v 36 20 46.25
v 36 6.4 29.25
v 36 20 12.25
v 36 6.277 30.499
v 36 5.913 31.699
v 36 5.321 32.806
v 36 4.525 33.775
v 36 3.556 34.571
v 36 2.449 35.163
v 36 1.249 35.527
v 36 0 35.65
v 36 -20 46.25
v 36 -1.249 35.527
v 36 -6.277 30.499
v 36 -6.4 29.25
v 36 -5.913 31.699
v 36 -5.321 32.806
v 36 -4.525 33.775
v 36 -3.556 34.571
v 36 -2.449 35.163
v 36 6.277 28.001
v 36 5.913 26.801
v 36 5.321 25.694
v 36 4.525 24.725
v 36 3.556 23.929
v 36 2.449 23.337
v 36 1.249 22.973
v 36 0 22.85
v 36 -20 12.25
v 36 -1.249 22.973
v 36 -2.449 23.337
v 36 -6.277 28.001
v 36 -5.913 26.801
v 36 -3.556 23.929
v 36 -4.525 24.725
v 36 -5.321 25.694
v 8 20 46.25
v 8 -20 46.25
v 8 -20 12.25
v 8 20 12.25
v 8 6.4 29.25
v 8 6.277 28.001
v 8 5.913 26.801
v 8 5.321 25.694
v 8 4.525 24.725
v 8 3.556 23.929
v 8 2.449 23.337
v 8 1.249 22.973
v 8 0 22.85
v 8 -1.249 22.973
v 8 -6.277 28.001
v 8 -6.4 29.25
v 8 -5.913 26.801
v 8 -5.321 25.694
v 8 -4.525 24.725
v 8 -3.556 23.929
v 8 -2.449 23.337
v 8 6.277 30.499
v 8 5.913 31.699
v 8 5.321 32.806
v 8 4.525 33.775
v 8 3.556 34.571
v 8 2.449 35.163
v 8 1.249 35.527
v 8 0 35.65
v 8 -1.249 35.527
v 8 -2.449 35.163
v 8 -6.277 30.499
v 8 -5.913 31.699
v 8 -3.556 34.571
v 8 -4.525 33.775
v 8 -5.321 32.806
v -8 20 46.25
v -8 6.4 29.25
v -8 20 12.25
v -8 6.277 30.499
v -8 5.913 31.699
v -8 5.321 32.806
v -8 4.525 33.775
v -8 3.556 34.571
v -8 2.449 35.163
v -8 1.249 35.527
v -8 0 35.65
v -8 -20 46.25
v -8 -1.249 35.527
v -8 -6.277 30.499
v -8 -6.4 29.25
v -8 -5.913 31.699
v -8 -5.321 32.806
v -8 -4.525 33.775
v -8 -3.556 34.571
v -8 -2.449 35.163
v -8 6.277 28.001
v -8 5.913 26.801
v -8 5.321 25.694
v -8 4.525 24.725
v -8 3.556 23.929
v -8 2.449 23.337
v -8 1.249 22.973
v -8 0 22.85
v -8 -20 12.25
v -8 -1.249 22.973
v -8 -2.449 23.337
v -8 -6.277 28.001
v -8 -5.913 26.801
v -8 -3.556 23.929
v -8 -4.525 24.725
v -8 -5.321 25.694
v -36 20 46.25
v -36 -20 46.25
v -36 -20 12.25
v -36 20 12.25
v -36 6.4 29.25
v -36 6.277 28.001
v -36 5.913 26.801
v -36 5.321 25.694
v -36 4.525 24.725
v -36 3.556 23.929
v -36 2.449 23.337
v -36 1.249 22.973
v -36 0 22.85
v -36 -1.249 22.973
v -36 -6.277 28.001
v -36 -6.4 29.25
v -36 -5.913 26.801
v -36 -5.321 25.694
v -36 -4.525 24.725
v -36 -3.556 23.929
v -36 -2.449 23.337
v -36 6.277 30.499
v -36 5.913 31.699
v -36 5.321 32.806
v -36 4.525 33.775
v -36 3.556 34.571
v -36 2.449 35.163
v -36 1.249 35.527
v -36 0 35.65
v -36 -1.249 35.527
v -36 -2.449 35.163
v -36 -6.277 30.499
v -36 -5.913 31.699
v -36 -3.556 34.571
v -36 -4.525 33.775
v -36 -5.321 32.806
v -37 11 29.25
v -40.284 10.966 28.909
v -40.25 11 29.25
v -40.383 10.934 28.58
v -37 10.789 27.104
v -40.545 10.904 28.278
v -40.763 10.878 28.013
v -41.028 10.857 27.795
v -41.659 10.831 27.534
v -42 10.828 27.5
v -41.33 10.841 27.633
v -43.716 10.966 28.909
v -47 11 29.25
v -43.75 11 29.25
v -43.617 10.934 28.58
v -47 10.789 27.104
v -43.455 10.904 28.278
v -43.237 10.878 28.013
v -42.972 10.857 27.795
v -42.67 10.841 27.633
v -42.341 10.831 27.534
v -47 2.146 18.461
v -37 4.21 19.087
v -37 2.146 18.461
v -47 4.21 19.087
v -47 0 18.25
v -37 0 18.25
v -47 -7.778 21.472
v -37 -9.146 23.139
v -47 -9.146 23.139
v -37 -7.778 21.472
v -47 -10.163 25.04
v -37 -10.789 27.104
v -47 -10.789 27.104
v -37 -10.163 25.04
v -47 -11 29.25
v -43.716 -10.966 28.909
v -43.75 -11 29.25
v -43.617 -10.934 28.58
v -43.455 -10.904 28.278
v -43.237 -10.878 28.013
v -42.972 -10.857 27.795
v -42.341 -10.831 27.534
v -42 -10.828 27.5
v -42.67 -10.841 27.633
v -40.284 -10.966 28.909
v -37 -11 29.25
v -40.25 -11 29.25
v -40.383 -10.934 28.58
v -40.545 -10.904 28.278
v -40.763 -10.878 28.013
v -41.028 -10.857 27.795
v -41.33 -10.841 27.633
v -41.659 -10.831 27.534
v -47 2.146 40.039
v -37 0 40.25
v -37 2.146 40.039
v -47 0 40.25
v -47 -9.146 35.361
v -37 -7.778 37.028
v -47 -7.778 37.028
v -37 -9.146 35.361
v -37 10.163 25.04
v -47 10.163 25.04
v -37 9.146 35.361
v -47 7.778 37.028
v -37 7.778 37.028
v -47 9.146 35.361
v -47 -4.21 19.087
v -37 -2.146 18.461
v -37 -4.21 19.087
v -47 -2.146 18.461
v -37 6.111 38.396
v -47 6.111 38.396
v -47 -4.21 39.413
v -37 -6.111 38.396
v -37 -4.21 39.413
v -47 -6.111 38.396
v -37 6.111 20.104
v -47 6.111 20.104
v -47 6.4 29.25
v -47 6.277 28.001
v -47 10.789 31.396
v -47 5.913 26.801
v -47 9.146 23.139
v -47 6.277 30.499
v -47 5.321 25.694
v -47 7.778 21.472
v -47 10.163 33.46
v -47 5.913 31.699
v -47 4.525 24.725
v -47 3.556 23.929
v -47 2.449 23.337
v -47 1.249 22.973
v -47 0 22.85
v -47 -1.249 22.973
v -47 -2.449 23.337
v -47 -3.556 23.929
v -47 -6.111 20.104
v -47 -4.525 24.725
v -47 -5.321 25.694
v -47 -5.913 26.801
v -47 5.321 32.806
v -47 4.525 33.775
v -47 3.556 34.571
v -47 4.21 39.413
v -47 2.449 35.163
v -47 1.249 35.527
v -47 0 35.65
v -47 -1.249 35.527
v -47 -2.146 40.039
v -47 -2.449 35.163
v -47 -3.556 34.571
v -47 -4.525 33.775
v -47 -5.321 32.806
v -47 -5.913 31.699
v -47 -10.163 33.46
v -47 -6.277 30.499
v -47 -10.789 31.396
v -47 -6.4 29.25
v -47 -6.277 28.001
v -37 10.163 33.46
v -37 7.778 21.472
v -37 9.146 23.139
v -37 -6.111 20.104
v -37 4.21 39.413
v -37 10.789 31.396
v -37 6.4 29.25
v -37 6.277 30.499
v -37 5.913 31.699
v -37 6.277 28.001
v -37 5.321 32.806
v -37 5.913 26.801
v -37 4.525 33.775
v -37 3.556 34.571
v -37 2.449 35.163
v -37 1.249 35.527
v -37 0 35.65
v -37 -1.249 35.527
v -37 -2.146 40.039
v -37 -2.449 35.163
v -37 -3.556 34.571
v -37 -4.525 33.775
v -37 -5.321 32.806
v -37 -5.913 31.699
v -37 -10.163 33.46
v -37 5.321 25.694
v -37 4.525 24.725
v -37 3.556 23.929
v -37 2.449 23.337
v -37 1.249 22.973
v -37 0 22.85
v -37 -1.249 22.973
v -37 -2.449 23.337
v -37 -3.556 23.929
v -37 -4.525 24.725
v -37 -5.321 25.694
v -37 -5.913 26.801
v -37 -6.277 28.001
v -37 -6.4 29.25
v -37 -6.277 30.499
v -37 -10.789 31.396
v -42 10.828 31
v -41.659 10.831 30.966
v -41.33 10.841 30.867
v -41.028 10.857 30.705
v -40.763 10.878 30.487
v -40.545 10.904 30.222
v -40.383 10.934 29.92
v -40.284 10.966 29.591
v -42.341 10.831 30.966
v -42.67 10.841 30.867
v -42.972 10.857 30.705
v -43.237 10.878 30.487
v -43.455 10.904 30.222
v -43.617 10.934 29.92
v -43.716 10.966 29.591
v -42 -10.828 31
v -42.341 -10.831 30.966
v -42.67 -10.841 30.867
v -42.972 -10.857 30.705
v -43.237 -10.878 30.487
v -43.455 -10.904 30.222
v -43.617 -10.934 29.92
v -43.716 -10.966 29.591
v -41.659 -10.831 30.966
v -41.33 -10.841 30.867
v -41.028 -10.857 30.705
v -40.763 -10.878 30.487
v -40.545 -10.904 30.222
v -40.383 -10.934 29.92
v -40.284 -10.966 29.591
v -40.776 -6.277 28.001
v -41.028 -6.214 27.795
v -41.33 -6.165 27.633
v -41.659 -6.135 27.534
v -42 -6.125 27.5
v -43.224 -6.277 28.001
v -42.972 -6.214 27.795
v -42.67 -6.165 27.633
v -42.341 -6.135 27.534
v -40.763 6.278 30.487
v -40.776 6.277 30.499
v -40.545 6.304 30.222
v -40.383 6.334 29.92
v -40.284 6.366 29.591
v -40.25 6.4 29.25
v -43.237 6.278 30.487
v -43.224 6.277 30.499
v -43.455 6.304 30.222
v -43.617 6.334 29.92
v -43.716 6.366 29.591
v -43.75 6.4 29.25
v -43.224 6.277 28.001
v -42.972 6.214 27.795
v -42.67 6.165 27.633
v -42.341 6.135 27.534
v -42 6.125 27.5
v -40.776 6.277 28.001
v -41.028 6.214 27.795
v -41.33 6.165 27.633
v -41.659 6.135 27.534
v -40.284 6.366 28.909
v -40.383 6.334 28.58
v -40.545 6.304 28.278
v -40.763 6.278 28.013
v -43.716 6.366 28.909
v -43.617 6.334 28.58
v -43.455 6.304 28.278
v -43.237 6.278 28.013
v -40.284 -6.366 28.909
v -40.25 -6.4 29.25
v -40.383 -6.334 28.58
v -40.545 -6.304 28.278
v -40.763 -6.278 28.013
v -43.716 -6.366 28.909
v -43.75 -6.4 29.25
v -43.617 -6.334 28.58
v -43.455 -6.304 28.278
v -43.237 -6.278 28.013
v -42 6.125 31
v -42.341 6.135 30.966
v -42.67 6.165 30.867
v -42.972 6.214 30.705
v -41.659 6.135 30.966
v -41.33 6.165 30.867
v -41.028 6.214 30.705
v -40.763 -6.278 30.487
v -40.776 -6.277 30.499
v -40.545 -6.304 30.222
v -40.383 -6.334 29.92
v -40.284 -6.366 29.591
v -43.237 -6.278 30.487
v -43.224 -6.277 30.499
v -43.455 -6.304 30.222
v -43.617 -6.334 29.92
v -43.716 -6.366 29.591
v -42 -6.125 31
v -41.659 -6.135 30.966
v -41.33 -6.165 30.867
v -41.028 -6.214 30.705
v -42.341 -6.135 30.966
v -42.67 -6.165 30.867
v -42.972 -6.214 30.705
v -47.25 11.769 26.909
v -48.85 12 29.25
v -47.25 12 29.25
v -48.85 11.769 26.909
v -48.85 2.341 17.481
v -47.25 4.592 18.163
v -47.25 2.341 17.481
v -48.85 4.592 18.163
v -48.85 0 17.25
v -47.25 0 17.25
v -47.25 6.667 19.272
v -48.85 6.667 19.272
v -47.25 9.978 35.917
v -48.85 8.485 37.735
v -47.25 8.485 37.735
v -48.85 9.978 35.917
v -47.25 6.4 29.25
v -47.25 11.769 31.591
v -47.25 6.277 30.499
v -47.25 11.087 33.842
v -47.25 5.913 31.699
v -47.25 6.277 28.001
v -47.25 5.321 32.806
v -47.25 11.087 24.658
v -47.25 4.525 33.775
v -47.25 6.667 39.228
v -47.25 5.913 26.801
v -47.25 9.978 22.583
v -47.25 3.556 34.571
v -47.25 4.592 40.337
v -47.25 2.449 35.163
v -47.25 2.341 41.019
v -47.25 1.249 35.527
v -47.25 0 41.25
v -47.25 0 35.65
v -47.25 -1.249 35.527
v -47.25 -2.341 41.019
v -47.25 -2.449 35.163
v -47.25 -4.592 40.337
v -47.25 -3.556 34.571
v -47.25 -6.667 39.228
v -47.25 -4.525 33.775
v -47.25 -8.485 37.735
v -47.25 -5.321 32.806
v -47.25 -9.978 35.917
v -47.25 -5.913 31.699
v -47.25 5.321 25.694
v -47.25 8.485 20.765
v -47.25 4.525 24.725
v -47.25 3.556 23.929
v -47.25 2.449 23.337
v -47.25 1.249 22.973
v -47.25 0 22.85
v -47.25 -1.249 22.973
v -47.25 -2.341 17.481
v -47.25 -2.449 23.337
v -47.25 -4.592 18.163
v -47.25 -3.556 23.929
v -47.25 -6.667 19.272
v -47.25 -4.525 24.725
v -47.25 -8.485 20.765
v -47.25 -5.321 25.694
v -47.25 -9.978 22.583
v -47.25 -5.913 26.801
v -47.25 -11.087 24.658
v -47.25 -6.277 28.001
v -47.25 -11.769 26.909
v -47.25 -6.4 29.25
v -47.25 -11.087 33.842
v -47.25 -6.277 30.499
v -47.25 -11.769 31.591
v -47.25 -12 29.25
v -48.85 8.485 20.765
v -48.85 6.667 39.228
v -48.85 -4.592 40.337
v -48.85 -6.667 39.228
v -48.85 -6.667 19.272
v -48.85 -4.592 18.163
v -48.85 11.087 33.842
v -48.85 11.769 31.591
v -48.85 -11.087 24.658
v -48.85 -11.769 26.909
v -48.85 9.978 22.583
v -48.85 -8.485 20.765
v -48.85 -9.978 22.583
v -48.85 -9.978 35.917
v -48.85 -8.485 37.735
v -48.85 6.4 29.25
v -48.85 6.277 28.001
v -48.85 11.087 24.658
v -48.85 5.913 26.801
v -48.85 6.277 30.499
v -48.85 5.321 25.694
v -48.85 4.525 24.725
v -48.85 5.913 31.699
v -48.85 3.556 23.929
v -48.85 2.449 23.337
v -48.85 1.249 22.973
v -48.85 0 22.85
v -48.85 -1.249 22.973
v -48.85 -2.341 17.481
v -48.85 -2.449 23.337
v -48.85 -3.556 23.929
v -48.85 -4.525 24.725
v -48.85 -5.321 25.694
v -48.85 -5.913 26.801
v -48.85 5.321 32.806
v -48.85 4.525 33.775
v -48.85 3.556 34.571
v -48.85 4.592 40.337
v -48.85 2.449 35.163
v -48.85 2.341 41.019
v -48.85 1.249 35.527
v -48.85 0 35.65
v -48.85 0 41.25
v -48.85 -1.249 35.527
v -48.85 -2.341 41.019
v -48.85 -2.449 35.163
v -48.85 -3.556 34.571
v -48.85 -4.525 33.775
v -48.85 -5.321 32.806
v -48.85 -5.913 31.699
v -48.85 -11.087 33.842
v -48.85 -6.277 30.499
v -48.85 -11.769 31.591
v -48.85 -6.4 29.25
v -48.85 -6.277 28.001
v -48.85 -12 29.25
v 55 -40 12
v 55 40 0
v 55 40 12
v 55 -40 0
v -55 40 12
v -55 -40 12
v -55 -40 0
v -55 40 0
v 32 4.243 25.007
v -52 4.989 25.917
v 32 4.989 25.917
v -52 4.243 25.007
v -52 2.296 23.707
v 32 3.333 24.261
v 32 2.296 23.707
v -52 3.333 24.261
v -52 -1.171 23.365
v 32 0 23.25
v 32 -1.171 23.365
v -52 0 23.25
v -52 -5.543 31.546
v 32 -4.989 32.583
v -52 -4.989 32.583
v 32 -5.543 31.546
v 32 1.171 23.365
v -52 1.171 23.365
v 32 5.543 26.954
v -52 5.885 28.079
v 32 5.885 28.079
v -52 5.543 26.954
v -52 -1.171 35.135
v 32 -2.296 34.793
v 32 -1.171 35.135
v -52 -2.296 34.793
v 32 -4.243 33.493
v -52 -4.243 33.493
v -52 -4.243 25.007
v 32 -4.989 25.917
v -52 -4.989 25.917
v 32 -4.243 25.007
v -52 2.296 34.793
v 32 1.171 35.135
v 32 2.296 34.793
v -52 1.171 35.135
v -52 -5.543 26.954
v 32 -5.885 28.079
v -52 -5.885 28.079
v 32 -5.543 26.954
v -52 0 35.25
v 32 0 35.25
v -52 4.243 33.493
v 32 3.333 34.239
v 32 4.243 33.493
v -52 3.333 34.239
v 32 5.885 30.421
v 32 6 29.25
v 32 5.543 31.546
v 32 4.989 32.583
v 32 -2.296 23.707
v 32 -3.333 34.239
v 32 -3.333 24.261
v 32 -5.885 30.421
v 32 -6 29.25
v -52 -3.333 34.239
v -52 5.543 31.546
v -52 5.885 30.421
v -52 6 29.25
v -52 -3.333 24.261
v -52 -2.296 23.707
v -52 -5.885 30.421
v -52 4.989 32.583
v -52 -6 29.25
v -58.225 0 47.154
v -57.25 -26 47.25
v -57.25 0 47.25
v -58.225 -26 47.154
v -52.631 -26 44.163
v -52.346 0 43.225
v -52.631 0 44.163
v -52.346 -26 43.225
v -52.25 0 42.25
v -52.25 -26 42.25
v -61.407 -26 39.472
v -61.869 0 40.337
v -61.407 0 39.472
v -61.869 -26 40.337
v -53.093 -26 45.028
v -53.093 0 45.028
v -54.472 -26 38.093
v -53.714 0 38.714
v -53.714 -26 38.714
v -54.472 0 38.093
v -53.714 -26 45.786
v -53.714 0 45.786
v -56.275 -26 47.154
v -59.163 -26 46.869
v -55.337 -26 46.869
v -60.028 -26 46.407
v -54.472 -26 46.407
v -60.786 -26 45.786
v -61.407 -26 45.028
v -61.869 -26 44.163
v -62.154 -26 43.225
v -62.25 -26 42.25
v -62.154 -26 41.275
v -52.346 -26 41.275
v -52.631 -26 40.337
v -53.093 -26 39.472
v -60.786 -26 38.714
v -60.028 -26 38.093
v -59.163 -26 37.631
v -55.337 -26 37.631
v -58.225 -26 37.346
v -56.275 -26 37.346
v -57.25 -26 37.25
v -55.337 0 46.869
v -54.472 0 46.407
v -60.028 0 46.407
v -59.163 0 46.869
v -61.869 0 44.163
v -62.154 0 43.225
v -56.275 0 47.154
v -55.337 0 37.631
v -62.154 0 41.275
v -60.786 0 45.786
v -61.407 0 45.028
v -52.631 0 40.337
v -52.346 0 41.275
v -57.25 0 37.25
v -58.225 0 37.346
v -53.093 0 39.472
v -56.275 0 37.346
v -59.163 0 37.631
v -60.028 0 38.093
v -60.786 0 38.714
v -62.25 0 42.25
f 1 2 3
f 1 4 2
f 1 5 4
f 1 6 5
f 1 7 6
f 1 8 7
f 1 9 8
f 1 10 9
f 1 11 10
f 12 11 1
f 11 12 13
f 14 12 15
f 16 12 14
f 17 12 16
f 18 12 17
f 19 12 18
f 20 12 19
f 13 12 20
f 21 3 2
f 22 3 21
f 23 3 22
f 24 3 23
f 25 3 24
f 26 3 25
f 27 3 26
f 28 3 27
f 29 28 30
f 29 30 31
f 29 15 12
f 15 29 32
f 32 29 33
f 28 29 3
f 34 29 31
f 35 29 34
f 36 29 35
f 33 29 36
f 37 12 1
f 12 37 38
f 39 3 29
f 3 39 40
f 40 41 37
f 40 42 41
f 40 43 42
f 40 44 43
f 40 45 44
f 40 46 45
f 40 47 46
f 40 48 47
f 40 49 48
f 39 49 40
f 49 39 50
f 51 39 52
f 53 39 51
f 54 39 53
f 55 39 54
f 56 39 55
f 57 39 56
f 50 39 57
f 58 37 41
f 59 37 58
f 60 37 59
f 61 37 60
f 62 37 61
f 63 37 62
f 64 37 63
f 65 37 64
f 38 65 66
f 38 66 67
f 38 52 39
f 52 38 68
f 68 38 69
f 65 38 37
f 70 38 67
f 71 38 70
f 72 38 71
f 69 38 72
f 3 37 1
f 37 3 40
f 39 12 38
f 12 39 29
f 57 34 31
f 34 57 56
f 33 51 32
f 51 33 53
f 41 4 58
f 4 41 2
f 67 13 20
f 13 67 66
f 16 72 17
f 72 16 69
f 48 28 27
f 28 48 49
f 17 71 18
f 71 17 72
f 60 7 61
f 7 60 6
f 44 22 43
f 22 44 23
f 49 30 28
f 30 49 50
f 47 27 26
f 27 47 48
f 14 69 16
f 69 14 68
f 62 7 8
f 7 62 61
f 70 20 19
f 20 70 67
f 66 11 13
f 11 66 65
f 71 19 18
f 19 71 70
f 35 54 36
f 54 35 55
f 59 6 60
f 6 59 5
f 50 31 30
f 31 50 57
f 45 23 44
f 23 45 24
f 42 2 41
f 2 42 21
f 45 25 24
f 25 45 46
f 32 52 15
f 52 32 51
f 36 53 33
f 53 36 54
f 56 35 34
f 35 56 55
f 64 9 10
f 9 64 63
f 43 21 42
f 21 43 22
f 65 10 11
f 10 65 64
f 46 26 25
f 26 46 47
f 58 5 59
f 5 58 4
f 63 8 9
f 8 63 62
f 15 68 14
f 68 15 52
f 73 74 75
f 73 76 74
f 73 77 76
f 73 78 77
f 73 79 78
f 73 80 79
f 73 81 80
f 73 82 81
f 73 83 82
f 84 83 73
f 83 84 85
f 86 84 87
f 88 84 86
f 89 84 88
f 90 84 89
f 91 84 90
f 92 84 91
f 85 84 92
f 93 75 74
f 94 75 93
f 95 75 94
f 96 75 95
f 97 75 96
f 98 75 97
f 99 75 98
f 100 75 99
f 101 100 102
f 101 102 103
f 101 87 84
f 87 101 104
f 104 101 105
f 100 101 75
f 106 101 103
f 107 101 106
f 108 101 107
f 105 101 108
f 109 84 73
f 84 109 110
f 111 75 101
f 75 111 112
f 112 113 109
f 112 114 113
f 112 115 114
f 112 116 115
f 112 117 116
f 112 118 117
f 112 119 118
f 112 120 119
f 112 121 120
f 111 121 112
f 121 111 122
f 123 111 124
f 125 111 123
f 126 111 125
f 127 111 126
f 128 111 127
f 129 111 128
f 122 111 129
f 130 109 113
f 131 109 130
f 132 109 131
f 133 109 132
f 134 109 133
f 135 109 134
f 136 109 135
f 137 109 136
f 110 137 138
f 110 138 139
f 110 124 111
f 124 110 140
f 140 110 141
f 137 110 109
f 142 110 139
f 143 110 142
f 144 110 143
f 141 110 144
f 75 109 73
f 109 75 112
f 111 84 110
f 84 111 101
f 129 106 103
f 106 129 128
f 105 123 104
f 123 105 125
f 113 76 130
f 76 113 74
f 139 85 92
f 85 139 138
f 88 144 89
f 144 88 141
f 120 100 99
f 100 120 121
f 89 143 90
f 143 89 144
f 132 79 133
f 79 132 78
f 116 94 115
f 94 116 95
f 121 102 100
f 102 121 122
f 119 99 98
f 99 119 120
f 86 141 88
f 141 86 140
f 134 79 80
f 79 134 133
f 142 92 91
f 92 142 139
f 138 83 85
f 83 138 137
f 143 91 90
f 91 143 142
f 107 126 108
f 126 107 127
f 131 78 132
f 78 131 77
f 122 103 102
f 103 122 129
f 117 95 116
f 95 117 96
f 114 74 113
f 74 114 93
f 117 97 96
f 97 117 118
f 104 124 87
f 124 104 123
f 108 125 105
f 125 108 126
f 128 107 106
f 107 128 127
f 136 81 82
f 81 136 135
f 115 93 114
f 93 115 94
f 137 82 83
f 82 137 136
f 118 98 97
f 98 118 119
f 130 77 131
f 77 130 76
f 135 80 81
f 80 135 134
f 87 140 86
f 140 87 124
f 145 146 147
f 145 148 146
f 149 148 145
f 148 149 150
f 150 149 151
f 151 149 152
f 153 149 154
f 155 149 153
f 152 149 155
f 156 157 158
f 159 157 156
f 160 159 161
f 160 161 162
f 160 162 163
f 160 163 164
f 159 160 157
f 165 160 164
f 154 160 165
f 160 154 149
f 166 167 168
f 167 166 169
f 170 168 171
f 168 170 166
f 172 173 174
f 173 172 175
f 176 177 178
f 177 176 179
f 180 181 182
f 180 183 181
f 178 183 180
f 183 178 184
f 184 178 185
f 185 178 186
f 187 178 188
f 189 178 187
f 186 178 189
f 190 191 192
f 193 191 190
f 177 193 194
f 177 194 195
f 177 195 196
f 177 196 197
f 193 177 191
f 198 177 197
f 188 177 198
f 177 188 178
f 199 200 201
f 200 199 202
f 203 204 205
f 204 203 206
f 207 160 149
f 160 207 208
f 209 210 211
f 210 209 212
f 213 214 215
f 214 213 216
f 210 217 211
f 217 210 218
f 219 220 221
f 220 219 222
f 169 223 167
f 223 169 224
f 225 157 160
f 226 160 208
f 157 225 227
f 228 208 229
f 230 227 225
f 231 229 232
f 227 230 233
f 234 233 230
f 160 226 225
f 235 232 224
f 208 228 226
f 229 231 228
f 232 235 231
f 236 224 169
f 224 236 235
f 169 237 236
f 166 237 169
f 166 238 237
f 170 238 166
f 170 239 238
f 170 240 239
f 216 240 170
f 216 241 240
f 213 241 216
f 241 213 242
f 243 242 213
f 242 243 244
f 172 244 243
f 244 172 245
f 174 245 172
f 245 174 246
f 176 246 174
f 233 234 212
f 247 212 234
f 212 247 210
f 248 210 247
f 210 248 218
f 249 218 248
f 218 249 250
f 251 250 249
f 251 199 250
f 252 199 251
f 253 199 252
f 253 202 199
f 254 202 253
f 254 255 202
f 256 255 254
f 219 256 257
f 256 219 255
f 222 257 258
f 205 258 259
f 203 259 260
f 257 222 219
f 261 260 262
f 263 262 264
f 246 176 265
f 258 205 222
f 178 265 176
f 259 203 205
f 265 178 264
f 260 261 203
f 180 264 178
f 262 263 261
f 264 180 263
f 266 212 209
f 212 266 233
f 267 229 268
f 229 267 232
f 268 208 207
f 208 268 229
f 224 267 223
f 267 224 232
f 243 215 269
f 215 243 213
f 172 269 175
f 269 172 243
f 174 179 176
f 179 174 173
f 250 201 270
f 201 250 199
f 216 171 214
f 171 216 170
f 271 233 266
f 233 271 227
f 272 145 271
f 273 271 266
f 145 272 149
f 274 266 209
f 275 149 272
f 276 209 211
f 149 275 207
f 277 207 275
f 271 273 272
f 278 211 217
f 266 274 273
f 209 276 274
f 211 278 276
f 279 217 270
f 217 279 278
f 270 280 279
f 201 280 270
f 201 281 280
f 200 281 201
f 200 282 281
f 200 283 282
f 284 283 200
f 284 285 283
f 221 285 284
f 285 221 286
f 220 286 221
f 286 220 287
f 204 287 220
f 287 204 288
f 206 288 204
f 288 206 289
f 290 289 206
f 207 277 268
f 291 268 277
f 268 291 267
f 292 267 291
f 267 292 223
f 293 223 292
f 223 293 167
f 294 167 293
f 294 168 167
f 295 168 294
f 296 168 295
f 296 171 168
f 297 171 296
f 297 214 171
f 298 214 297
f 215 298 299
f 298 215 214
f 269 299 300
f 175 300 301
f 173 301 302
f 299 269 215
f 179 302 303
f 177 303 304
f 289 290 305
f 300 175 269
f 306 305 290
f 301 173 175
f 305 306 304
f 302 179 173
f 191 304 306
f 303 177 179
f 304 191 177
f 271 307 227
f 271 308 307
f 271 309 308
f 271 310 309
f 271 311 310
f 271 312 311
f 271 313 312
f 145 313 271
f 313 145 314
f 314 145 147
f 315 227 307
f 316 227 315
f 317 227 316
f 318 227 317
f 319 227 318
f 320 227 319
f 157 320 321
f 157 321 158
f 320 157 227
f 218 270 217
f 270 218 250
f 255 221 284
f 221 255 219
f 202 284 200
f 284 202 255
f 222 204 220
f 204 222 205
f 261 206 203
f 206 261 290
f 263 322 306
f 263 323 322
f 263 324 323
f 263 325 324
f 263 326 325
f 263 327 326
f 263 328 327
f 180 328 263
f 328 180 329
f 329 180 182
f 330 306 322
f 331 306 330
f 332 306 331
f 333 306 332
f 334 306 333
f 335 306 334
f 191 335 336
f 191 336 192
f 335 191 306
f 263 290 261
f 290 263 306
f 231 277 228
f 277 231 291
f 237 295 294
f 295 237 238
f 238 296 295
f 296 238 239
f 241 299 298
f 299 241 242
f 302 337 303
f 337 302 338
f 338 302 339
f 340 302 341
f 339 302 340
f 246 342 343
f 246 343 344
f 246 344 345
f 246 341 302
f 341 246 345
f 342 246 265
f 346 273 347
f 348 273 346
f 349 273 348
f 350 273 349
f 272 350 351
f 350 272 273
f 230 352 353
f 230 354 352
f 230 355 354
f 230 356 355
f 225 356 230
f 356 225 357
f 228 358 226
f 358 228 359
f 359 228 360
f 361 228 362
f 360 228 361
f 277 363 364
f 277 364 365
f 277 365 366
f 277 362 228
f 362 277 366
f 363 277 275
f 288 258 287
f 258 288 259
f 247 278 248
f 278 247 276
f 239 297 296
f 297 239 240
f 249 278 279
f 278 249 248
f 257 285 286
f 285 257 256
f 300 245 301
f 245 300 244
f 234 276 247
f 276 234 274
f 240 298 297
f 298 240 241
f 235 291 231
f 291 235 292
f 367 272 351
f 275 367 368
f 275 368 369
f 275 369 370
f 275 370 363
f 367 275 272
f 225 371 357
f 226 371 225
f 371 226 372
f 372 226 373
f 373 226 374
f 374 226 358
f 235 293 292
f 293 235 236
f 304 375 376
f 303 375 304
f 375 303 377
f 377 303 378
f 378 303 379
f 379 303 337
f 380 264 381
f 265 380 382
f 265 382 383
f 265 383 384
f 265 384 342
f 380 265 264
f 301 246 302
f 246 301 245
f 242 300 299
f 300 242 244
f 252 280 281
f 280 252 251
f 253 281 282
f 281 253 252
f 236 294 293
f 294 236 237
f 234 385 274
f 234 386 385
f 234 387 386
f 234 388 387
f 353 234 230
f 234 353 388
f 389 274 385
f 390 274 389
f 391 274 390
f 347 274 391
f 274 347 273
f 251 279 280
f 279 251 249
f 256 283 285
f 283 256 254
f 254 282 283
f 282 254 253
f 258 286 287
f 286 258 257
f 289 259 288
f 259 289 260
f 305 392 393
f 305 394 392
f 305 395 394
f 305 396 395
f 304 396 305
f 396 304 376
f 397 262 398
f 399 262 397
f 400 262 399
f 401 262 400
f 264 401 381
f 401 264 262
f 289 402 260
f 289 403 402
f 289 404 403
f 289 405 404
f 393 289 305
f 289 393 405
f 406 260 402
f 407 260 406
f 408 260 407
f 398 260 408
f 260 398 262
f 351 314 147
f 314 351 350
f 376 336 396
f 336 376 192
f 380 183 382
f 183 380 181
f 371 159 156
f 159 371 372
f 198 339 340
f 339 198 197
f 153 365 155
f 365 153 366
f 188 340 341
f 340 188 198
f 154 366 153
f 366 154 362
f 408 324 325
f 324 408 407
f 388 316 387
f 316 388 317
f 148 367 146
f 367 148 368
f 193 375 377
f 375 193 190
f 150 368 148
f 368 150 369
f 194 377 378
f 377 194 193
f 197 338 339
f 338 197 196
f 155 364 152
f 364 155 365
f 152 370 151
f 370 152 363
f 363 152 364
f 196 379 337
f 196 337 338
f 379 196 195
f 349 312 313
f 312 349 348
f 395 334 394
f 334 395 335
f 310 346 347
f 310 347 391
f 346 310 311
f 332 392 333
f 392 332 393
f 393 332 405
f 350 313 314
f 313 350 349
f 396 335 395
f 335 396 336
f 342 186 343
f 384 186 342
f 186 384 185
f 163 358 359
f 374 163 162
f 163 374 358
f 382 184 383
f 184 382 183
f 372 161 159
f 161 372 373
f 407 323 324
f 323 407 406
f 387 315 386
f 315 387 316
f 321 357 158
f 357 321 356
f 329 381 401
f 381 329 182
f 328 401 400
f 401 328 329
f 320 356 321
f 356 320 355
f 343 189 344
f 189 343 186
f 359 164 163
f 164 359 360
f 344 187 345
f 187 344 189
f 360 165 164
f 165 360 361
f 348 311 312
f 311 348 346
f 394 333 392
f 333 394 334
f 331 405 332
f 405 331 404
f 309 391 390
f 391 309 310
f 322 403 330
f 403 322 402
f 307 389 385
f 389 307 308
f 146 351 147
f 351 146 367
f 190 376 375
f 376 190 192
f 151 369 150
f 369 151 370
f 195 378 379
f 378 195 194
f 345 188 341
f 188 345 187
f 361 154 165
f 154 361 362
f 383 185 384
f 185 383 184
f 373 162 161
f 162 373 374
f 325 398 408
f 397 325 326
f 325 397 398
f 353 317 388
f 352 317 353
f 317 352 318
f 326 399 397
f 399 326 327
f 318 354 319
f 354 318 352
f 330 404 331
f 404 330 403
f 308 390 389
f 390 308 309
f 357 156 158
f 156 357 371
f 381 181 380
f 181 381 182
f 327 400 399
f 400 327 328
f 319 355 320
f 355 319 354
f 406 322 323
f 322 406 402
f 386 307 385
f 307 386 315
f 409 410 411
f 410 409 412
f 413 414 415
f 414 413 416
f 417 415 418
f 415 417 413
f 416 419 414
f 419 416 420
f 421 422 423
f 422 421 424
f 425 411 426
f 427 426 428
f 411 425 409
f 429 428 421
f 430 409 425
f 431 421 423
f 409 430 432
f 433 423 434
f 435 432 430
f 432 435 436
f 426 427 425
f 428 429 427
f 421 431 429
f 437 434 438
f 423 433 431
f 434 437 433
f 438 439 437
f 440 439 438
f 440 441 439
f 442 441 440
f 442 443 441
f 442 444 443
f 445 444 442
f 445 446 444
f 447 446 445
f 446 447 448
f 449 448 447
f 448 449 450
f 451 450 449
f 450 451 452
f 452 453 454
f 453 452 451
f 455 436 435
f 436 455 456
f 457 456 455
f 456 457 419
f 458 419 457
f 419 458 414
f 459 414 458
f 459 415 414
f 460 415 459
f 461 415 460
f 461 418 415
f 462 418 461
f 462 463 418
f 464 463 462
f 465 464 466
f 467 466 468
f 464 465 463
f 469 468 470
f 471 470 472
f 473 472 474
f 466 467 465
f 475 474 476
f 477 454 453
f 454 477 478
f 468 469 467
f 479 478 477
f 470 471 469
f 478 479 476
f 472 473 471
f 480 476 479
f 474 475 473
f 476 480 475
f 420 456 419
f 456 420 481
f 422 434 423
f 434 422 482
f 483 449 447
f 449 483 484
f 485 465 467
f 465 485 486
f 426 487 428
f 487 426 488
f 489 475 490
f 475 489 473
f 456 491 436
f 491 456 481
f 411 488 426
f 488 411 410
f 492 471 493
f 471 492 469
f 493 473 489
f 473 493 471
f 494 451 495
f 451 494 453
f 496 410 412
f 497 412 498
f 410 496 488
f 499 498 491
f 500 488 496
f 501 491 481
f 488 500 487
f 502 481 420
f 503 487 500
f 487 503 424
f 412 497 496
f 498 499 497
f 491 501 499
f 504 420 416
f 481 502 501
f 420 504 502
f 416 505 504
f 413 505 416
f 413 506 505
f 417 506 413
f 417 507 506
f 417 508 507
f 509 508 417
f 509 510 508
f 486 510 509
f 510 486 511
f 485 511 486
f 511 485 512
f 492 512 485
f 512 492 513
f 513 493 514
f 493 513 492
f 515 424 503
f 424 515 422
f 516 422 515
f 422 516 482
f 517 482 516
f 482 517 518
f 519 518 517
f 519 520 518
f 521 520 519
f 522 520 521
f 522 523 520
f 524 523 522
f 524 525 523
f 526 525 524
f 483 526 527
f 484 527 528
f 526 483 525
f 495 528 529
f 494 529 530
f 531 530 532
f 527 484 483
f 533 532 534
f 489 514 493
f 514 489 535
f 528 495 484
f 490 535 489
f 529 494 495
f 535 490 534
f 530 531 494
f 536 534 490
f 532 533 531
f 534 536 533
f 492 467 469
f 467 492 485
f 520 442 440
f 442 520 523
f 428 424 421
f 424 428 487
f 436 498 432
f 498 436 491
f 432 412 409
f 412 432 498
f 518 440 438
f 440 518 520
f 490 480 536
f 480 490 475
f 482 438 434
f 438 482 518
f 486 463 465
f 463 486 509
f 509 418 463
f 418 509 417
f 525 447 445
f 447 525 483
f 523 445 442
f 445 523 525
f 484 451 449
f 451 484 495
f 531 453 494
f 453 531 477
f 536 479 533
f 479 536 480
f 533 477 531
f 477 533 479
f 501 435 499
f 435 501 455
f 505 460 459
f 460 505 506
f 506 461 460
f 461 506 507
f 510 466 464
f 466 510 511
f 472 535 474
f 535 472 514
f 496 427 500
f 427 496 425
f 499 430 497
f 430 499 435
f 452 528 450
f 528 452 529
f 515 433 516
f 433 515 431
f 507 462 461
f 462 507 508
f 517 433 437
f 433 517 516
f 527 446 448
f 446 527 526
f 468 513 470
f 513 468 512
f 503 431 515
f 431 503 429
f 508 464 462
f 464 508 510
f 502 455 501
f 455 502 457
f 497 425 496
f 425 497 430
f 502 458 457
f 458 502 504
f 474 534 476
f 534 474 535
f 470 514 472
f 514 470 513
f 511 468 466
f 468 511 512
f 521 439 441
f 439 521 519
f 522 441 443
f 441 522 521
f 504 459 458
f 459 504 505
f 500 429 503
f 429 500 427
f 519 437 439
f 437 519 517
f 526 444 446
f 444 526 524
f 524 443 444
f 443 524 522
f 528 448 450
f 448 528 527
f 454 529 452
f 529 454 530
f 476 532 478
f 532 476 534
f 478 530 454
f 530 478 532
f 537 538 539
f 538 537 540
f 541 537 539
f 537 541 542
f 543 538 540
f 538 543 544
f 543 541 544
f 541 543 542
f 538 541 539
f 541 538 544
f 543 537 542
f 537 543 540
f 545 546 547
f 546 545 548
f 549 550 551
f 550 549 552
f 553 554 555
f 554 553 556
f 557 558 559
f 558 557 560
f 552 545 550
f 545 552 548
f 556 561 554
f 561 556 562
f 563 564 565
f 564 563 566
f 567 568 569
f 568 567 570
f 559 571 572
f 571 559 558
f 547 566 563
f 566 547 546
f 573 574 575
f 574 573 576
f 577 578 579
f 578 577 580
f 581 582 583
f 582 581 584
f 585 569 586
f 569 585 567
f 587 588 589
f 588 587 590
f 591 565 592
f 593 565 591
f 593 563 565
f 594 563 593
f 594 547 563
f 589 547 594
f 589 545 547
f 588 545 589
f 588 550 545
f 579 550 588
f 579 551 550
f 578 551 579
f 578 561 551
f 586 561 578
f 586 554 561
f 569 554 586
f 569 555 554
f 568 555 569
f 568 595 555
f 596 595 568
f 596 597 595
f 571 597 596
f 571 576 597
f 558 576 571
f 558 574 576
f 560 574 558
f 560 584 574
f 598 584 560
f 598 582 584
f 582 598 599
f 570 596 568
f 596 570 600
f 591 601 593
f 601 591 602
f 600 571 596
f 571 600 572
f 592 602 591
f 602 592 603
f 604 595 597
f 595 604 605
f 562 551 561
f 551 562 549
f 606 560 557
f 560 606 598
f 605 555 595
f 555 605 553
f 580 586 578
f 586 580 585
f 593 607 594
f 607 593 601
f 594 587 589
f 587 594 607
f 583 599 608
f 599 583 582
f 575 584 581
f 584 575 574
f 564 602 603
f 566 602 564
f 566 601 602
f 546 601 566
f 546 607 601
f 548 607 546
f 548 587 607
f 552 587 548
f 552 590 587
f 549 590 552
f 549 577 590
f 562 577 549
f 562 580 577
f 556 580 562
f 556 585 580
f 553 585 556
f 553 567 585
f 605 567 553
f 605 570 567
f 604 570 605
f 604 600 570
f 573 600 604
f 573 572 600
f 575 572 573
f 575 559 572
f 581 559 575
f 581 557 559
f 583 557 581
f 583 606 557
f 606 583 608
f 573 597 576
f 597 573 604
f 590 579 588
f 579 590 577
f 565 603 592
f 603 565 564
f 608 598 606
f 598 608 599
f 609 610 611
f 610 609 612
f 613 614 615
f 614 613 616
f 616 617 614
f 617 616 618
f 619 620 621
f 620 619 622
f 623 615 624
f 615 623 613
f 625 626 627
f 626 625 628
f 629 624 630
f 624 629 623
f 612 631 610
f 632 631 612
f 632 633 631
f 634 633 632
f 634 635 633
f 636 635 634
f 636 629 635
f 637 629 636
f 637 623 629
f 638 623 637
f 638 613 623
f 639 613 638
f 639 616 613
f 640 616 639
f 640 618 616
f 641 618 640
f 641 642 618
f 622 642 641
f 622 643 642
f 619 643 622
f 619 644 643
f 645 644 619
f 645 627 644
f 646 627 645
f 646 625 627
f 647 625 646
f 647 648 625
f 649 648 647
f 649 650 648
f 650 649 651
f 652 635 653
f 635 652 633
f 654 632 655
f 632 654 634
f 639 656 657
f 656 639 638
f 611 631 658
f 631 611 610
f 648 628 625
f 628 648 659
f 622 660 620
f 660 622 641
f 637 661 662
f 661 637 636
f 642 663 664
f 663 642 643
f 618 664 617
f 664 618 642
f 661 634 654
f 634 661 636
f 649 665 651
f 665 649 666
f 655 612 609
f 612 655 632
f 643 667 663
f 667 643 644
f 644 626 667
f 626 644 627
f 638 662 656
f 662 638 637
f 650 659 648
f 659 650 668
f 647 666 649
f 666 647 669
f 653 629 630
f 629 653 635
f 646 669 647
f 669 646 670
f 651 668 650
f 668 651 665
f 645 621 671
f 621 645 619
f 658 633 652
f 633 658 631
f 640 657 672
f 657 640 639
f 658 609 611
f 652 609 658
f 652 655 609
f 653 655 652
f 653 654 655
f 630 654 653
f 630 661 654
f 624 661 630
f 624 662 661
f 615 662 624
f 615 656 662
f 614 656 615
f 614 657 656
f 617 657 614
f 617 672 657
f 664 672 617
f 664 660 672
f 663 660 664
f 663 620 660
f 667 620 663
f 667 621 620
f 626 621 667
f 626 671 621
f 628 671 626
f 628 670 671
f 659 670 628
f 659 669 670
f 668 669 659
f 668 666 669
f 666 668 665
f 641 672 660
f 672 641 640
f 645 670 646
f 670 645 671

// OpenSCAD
$fn = 32;

// ------------------------------------------------------------------------
// Machine vise: screw d12, jaws 28 x 34 mm
// Every part is its own module, assembly() places every instance.
// ------------------------------------------------------------------------

// --- part 1 ---
module vise_bed() {
  difference() {
    translate([-55, -40, 0]) cube([110, 80, 12]);
  }
}

// --- part 2 ---
module vise_jaw() {
  difference() {
    translate([-14, -20, 0]) cube([28, 40, 34]);
    translate([0, 0, 17]) rotate([0, 90, 0]) cylinder(h = 30, d = 12.8, center = true);
  }
}

// --- part 3 ---
module vise_screw() {
  translate([0, 0, -42]) cylinder(h = 84, d = 12);
}

// --- part 4 ---
module screw_collar() {
  difference() {
    cylinder(h = 10, d = 22);
    translate([0, 0, -1]) cylinder(h = 12, d = 12.8);
    translate([0, 0, 5]) rotate([90, 0, 0]) cylinder(h = 24, d = 3.5, center = true);
  }
}

// --- part 5 ---
module screw_washer() {
  difference() {
      translate([0, 0, 0]) cylinder(h = 1.6, d = 24);
      translate([0, 0, -1]) cylinder(h = 3.6, d = 12.8);
    }
}

// --- part 6 ---
module vise_handle() {
  cylinder(h = 26, d = 10);
}

// --- assembly ---
module assembly() {
  color([0.80, 0.24, 0.20]) translate([0, 0, 0]) rotate([0, 0, 0]) vise_bed();
  color([0.20, 0.45, 0.75]) translate([22, 0, 12.25]) rotate([0, 0, 0]) vise_jaw();
  color([0.25, 0.62, 0.32]) translate([-22, 0, 12.25]) rotate([0, 0, 0]) vise_jaw();
  color([0.92, 0.70, 0.18]) translate([-10, 0, 29.25]) rotate([0, 90, 0]) vise_screw();
  color([0.58, 0.35, 0.70]) translate([-47, 0, 29.25]) rotate([0, 90, 0]) screw_collar();
  color([0.16, 0.66, 0.66]) translate([-48.85, 0, 29.25]) rotate([0, 90, 0]) screw_washer();
  color([0.85, 0.48, 0.18]) translate([-57.25, 0, 42.25]) rotate([90, 0, 0]) vise_handle();
}

assembly();
